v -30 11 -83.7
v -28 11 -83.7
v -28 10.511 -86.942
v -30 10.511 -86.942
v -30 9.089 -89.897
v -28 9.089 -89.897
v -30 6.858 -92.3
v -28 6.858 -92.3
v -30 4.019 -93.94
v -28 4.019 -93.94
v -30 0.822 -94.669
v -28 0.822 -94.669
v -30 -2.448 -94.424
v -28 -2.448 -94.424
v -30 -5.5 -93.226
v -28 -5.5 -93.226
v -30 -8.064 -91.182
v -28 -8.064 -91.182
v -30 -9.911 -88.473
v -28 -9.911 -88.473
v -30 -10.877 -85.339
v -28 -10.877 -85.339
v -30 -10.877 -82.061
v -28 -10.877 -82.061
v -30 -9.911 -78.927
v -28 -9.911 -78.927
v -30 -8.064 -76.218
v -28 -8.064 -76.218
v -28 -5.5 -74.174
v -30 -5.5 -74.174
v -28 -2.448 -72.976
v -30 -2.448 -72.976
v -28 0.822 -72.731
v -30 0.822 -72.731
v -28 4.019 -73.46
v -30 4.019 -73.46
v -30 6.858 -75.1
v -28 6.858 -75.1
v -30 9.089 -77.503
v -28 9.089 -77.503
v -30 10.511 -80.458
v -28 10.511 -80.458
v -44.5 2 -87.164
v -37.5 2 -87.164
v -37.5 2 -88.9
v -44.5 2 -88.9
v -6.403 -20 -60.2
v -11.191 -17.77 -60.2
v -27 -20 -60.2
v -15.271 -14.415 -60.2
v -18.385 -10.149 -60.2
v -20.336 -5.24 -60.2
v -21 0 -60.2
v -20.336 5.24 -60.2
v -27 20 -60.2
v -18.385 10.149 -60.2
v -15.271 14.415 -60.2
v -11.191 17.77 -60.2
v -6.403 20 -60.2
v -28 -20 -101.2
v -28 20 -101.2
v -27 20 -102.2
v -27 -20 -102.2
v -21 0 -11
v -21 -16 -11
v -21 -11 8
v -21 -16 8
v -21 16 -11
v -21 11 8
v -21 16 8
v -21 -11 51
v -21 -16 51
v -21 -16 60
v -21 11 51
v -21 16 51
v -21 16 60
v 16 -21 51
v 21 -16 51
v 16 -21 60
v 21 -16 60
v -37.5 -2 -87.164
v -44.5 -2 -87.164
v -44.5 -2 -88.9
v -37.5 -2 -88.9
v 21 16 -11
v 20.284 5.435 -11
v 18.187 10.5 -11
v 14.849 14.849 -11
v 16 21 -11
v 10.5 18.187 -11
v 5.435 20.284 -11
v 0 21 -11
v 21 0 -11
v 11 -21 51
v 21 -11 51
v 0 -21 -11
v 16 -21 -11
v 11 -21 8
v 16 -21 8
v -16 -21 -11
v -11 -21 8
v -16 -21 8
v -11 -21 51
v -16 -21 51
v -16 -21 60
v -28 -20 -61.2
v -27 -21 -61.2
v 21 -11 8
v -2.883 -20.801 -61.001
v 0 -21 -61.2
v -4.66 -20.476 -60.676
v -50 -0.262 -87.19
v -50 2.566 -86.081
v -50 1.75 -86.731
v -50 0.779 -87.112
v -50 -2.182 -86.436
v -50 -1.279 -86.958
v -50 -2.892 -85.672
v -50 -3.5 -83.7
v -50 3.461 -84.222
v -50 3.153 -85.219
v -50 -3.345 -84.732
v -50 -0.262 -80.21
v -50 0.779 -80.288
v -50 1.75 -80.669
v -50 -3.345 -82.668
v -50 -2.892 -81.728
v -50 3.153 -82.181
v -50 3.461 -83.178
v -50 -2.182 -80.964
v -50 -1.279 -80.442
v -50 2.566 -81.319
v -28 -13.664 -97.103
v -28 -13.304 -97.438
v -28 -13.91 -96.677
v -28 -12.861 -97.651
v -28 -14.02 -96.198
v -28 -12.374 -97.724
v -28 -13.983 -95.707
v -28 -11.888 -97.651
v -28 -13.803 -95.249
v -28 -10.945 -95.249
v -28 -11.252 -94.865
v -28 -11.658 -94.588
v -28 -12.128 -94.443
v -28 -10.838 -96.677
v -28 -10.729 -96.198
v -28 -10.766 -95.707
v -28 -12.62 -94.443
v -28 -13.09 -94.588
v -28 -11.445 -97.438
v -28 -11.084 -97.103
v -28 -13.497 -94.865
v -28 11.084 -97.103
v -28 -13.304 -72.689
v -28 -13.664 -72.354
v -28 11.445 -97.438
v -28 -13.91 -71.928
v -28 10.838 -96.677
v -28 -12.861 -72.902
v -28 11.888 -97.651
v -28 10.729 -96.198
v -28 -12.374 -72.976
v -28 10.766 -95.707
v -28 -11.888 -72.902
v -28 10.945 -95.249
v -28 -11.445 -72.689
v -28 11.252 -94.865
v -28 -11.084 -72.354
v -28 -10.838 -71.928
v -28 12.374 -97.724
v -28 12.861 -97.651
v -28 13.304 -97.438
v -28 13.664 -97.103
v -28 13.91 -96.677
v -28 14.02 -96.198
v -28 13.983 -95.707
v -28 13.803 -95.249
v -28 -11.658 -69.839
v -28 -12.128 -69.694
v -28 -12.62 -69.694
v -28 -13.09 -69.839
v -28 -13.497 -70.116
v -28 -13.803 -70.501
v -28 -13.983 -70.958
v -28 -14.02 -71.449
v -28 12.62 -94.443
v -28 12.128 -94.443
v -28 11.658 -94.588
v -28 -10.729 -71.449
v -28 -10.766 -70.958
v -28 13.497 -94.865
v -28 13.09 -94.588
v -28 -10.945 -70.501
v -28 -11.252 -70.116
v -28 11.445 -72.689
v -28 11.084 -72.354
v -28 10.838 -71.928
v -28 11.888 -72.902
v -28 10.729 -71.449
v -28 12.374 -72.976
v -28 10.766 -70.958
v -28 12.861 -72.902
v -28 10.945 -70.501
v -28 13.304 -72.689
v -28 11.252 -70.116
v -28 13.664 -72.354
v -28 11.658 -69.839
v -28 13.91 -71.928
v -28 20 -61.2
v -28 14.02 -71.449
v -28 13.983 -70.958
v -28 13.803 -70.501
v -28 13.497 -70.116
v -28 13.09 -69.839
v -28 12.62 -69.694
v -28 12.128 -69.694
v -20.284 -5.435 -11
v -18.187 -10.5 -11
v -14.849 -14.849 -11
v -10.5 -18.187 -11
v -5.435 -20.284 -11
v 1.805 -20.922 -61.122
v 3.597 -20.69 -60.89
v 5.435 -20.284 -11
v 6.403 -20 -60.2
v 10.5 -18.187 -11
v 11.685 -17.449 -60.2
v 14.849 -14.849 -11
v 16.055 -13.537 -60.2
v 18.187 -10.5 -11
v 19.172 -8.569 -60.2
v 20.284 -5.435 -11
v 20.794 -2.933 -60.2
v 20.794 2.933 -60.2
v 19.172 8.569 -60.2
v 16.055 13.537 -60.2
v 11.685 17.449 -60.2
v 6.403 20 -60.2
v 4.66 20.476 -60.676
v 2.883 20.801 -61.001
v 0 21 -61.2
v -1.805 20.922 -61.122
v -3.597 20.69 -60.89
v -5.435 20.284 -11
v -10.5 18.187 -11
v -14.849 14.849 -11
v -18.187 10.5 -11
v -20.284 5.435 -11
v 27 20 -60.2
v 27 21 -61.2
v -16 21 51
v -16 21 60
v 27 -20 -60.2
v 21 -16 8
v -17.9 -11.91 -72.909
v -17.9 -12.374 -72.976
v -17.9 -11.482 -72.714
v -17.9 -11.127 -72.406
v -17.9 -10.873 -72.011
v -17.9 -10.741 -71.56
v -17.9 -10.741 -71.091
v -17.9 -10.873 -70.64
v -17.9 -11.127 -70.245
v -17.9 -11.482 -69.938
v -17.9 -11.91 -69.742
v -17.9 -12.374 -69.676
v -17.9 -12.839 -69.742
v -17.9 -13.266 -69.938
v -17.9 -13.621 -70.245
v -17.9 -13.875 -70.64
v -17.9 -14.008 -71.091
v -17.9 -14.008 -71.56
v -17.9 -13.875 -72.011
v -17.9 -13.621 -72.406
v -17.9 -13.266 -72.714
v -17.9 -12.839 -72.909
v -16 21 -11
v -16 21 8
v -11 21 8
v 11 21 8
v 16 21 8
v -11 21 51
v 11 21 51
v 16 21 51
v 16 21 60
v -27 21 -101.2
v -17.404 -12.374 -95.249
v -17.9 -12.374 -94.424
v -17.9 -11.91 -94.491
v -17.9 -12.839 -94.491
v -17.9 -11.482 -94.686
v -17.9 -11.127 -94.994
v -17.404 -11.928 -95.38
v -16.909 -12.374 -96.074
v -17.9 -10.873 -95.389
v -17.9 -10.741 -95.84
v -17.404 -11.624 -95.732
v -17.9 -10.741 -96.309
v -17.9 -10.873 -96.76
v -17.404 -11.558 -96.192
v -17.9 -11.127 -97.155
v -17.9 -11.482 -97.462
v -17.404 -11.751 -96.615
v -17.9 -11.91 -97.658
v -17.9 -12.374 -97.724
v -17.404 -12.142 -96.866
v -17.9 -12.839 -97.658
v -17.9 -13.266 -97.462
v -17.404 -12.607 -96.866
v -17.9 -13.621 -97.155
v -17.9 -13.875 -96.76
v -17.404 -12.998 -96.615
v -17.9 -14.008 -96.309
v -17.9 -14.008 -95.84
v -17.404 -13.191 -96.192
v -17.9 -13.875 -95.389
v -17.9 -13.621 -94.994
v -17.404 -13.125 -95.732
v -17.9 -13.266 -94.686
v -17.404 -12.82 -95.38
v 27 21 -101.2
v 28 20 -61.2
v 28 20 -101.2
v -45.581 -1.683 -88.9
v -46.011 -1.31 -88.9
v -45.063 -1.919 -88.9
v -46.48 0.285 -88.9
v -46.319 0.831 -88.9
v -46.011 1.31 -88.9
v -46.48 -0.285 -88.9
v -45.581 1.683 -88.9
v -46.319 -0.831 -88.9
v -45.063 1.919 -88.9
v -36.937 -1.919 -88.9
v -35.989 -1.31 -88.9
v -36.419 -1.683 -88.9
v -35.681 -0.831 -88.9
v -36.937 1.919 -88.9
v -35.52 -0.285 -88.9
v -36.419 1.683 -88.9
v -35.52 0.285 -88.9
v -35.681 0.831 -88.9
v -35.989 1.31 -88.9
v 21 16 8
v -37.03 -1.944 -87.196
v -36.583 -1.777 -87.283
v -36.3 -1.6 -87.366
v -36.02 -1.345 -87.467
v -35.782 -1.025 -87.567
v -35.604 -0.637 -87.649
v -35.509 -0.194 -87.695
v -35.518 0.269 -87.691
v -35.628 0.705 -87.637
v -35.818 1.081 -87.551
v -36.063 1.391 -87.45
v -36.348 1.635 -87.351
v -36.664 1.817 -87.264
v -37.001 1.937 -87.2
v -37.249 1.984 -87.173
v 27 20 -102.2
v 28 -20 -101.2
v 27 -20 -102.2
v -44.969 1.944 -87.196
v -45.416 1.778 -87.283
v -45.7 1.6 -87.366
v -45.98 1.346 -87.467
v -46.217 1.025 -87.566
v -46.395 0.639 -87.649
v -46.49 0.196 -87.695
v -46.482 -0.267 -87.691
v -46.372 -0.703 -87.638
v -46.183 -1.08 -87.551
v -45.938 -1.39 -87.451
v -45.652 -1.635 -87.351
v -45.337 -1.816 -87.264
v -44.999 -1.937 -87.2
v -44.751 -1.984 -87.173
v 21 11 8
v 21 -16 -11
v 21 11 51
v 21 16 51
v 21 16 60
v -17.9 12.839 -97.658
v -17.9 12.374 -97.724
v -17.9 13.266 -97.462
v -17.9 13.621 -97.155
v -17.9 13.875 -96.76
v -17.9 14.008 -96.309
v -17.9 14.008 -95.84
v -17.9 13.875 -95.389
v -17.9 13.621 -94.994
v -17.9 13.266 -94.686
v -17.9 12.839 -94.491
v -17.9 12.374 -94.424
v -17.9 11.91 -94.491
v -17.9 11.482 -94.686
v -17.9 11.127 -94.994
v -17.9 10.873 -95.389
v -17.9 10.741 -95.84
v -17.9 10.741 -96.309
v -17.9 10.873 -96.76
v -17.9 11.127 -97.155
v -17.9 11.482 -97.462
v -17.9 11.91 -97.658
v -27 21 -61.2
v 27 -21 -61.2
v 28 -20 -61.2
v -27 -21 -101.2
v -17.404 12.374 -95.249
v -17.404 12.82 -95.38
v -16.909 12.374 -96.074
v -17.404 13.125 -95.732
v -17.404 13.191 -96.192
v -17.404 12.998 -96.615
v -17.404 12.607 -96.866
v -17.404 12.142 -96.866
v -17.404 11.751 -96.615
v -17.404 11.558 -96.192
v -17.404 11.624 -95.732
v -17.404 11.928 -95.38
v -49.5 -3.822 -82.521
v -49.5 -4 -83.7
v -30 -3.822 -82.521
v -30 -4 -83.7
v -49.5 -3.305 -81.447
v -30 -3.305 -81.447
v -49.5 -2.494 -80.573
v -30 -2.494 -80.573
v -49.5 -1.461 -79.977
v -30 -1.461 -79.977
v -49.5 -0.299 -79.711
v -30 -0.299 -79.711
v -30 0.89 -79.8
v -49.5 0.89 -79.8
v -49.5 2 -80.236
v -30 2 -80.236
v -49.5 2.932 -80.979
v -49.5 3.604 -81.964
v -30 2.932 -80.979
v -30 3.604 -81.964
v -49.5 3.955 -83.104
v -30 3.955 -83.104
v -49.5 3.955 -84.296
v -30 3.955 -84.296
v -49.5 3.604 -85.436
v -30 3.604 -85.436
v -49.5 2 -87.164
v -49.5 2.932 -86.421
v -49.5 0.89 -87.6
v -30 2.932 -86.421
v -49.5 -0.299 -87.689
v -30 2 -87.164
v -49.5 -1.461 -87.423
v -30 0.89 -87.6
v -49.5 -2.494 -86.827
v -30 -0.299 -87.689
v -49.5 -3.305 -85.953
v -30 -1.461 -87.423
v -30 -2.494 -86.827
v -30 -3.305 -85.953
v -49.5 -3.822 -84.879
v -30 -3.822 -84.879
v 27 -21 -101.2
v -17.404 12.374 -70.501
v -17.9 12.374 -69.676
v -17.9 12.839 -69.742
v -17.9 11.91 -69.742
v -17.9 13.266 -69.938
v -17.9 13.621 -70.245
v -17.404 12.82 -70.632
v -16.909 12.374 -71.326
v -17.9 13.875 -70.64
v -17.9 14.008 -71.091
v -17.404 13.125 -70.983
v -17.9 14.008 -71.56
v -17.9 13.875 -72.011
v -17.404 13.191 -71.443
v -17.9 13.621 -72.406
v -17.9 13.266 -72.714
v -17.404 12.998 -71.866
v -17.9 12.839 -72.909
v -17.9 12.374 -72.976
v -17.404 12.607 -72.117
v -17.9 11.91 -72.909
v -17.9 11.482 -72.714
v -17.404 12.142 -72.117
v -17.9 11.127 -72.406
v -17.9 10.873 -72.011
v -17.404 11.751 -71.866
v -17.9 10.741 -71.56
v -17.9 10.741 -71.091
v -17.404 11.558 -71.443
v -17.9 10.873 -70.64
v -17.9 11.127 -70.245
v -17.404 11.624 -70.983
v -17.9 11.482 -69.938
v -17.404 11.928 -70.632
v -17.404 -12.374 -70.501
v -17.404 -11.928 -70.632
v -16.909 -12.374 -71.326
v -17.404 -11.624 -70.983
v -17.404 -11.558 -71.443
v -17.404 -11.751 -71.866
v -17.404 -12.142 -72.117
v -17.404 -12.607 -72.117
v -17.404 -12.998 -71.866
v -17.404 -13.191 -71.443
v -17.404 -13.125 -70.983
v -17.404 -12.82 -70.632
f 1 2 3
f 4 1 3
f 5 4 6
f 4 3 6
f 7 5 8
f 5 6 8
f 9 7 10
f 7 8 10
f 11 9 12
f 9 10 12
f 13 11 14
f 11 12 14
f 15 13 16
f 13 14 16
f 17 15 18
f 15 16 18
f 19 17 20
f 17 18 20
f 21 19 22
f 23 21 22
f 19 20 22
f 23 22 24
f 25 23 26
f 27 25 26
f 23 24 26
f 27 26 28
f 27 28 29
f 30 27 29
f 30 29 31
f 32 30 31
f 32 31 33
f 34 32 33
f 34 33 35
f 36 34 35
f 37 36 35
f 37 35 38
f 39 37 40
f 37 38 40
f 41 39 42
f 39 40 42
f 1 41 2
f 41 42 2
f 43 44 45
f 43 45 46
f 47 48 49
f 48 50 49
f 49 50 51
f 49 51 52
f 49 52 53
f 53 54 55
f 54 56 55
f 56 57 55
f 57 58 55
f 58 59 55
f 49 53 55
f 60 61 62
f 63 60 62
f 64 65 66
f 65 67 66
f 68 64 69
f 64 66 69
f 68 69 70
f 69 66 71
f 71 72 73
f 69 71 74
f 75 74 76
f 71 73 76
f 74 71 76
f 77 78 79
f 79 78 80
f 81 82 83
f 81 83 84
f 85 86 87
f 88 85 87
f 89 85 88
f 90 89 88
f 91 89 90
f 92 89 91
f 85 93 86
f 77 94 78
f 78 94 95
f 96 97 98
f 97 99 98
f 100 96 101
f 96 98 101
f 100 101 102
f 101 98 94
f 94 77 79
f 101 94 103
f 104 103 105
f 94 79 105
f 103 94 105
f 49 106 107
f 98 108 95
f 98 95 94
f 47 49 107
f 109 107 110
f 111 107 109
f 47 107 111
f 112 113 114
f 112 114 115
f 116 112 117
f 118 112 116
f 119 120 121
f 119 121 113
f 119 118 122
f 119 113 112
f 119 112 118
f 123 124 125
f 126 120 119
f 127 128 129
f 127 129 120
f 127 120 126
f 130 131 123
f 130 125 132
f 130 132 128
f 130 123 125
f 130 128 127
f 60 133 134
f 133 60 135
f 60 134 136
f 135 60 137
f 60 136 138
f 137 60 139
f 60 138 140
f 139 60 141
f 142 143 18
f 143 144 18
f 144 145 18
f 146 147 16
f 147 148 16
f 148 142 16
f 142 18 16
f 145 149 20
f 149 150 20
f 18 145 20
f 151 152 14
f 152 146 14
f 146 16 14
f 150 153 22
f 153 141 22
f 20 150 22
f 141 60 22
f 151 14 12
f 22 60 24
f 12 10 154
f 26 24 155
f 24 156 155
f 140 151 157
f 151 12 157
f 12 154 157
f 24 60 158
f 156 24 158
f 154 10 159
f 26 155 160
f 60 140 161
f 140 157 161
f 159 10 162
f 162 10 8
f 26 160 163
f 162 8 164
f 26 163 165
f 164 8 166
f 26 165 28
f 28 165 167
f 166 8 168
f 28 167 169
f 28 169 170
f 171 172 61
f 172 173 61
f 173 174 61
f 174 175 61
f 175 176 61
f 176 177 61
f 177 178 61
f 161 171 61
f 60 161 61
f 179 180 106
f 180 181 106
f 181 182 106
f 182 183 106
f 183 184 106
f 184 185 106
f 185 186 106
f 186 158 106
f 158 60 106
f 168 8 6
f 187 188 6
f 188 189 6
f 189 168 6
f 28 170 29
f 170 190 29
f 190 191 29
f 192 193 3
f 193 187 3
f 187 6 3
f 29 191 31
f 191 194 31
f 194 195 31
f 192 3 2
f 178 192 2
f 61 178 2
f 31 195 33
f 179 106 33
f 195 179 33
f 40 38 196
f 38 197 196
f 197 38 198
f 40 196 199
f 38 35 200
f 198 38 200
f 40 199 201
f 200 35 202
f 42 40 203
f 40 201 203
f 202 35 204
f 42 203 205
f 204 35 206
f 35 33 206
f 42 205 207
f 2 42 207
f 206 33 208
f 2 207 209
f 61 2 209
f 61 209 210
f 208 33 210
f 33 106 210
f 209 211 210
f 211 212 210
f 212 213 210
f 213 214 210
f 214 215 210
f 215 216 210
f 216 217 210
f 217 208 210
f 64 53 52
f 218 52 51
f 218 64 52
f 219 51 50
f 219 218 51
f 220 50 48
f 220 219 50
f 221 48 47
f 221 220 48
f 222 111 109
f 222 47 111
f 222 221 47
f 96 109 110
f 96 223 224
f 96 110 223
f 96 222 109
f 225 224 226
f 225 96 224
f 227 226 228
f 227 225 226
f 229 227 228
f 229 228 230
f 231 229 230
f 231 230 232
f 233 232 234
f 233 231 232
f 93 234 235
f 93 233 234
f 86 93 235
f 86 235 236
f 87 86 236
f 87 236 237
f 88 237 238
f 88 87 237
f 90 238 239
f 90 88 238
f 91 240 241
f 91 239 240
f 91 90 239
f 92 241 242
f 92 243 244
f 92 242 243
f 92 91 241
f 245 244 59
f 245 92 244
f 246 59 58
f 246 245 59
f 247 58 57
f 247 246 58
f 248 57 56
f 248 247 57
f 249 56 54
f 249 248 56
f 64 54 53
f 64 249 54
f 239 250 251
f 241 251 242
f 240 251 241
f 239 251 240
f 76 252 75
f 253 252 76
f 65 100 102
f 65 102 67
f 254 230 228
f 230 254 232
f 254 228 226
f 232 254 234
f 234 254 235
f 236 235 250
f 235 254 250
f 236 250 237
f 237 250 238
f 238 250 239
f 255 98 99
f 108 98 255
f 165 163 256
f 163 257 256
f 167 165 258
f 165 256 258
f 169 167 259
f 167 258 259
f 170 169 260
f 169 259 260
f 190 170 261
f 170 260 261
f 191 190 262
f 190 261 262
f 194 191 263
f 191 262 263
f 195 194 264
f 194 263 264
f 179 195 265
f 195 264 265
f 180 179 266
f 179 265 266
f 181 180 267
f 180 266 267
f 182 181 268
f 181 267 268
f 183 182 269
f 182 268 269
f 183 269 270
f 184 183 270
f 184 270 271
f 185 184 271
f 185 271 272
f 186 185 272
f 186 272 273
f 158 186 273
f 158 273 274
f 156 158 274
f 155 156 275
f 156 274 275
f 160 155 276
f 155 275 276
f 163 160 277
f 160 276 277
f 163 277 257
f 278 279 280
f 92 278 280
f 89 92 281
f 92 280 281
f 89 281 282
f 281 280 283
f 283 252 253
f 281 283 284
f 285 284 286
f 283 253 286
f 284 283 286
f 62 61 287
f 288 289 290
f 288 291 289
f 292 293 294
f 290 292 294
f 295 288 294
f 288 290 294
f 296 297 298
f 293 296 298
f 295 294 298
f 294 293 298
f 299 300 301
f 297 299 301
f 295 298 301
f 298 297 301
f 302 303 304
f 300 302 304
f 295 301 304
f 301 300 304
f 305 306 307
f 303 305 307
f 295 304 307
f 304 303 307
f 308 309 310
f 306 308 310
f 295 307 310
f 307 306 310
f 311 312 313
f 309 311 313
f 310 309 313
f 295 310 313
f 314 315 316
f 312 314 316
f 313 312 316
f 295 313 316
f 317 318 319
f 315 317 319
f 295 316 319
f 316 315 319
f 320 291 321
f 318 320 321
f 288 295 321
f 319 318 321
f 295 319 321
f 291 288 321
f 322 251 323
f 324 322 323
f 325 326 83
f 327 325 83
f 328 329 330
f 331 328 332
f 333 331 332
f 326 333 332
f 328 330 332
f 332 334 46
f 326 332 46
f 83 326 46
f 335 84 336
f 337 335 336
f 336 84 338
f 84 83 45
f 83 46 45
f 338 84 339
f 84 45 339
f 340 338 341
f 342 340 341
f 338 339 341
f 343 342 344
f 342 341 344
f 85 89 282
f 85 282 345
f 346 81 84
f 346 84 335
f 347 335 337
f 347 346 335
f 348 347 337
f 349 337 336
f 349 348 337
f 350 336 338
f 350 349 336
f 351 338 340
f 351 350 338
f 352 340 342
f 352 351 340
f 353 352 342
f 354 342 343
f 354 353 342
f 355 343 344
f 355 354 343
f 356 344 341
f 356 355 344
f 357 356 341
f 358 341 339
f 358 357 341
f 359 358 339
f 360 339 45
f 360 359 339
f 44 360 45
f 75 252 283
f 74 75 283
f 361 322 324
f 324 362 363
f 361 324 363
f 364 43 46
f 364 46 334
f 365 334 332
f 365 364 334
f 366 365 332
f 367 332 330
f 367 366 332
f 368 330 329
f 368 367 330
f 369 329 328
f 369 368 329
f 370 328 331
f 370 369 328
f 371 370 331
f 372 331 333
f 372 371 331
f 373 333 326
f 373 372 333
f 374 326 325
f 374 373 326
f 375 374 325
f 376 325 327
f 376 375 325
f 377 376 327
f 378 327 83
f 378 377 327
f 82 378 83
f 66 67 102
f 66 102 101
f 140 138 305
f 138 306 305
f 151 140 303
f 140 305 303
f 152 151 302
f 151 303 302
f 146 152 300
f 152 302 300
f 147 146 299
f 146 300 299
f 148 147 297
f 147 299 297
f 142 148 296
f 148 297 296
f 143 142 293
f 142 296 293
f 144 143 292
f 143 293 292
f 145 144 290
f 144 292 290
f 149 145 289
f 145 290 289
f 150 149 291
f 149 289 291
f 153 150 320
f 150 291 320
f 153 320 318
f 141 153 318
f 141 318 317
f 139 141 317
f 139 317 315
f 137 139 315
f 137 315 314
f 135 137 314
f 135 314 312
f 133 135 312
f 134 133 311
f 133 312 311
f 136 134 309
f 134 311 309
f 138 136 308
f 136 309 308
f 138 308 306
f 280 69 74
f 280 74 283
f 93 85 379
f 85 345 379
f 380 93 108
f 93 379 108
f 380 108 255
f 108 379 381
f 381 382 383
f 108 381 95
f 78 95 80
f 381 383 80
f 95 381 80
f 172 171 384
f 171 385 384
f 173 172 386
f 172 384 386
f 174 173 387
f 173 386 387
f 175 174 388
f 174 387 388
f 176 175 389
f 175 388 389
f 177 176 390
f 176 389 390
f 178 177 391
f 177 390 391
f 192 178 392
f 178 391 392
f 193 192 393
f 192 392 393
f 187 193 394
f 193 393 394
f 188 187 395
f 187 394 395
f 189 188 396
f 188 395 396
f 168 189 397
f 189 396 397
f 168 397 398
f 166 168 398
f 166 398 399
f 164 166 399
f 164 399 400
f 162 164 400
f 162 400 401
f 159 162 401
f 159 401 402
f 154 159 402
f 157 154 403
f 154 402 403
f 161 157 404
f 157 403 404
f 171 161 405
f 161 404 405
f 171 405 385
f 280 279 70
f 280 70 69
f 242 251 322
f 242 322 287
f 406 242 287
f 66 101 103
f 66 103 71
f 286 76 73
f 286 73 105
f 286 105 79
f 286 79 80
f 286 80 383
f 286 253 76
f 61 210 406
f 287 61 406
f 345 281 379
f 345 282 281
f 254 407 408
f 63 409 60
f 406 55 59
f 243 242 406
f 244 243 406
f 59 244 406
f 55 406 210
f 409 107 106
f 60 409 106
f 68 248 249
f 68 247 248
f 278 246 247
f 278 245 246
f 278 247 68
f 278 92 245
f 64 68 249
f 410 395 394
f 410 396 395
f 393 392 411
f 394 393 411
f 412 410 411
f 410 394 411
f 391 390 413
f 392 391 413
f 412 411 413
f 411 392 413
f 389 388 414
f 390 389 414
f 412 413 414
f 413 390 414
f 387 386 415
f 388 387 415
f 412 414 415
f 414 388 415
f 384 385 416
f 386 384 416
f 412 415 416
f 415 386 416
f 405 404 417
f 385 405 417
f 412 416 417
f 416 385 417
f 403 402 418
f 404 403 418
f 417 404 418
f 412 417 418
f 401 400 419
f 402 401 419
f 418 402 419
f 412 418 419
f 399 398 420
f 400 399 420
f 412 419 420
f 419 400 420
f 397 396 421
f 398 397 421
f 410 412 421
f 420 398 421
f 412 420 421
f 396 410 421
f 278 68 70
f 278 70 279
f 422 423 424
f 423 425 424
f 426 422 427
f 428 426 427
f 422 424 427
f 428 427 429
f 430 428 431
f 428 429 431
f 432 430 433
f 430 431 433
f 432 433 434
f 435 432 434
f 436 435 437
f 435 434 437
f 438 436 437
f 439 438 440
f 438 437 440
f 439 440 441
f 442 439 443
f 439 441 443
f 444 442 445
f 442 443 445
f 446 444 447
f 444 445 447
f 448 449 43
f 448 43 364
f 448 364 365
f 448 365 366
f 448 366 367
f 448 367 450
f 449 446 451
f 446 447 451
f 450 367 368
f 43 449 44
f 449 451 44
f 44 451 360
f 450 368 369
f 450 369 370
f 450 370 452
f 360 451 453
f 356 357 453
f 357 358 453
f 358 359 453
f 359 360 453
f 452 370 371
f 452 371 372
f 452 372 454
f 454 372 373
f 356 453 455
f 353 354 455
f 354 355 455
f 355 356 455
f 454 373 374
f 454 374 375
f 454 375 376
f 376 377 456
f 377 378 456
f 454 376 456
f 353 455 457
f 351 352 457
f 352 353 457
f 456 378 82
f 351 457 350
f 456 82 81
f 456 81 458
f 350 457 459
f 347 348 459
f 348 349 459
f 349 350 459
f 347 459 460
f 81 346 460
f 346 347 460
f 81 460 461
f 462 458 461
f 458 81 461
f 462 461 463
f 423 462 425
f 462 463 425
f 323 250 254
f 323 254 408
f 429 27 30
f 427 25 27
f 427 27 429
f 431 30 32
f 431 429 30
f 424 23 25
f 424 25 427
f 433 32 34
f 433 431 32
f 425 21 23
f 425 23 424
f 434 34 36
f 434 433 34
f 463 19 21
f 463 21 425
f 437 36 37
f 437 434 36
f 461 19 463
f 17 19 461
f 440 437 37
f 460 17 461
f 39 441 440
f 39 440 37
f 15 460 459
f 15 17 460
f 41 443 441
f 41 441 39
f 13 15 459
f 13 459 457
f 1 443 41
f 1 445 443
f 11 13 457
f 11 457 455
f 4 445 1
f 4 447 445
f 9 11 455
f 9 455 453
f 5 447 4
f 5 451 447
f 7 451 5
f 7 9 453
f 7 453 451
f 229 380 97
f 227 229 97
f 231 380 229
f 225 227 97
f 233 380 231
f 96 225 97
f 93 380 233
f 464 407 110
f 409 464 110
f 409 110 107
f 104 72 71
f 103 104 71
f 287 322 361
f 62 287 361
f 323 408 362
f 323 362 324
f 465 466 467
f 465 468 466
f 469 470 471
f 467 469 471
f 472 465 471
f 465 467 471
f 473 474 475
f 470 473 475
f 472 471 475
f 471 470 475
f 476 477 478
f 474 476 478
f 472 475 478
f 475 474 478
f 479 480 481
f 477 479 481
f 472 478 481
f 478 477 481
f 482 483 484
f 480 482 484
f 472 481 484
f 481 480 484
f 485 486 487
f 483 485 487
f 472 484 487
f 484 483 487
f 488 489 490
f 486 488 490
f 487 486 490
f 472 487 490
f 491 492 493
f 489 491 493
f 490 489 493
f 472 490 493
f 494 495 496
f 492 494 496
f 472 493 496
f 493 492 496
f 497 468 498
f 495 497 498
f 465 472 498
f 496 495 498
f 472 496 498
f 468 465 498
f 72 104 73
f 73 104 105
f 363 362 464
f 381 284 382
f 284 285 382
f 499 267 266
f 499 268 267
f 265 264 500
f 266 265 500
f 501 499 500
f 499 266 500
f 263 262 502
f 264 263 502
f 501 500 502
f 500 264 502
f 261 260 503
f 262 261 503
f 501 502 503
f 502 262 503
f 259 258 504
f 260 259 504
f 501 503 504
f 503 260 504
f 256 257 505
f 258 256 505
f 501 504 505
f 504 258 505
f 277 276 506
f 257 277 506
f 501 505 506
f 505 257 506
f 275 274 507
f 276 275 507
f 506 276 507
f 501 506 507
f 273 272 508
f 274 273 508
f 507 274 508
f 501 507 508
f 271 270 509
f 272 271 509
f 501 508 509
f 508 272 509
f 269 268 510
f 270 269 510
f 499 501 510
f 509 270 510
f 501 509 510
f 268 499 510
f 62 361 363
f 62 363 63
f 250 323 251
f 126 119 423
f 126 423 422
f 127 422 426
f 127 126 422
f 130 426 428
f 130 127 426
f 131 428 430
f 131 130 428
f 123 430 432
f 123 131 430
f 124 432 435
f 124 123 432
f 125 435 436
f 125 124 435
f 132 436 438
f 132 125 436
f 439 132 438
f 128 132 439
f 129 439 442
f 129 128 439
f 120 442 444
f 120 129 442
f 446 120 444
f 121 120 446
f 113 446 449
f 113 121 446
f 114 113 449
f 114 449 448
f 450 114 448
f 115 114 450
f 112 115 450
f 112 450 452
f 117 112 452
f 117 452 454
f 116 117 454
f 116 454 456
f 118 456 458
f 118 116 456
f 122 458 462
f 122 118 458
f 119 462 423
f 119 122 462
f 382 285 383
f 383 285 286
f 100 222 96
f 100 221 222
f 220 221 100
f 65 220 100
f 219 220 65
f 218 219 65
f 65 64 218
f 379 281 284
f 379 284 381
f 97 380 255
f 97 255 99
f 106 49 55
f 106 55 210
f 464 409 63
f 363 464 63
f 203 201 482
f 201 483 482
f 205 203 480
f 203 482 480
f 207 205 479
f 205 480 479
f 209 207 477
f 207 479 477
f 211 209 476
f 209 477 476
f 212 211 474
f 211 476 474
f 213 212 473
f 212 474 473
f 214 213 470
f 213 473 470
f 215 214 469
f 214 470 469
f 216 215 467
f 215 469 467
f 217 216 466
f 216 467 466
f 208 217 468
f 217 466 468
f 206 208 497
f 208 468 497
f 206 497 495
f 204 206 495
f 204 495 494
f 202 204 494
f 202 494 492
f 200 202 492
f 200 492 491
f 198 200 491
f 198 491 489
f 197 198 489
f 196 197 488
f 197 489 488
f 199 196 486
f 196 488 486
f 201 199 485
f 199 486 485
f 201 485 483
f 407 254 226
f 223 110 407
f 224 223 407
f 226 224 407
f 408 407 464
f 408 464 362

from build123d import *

# Parameters (mm, degrees)
SKETCH_1_W             = 42
SKETCH_1_H             = 42
EXTRUDE_1_DEPTH        = 60
CHAMFER_1_SIZE         = 5
CUT_EXTRUDE_1_DEPTH    = 43
EXTRUDE_2_DEPTH        = 11
SKETCH_4_R             = 21
EXTRUDE_3_DEPTH        = 49.2
SKETCH_5_W             = 56
SKETCH_5_H             = 42
EXTRUDE_4_DEPTH        = 42
CHAMFER_2_SIZE         = 1
HOLE_WIZARD_M4_1_D     = 3.3
HOLE_WIZARD_M4_1_DEPTH = 10.1
HOLE_WIZARD_M4_1_TIP   = 0.991420021
SKETCH_10_R            = 11
EXTRUDE_5_DEPTH        = 2
SKETCH_11_R            = 4
EXTRUDE_6_DEPTH        = 20
CHAMFER_3_SIZE         = 0.5
EXTRUDE_7_DEPTH        = 1.2
EXTRUDE_7_DEPTH_BACK   = 1


with BuildPart() as part:
    # 스케치1 → 보스-돌출1 (new body)
    with BuildSketch(Plane.XY):
        Rectangle(SKETCH_1_W, SKETCH_1_H)
    extrude(amount=EXTRUDE_1_DEPTH)

    # 모따기1
    chamfer_1_edges = [part.edges().sort_by_distance(p)[0] for p in [
        (21, 21, 30),
        (21, -21, 30),
        (-21, 21, 30),
        (-21, -21, 30),
        (-21, 21, 30),
        (-21, -21, 30),
        (21, 21, 30),
        (21, -21, 30),
        (21, -21, 30),
        (-21, -21, 30),
        (-21, 21, 30),
        (21, 21, 30),
    ]]
    chamfer(chamfer_1_edges, length=CHAMFER_1_SIZE)

    # 스케치2 → 컷-돌출1 (cut)
    with BuildSketch(Plane.XY.offset(51)):
        Polygon((-11, 21), (-21, 21), (-21, 11), align=None)
        Polygon((21, 11), (21, 21), (11, 21), align=None)
        Polygon((11, -21), (21, -21), (21, -11), align=None)
        Polygon((-21, -11), (-21, -21), (-11, -21), align=None)
    extrude(amount=-CUT_EXTRUDE_1_DEPTH, mode=Mode.SUBTRACT)

    # 스케치3 → 보스-돌출2 (add)
    with BuildSketch(Plane(origin=(0, 0, 0), x_dir=(-1, 0, 0), z_dir=(0, 0, -1))):
        Polygon((-16, 21), (-21, 16), (-21, -16), (-16, -21), (16, -21), (21, -16), (21, 16), (16, 21), align=None)
    extrude(amount=EXTRUDE_2_DEPTH)

    # 스케치4 → 보스-돌출3 (add)
    with BuildSketch(Plane(origin=(0, 0, -11), x_dir=(-1, 0, 0), z_dir=(0, 0, -1))):
        Circle(SKETCH_4_R)
    extrude(amount=EXTRUDE_3_DEPTH)

    # 스케치5 → 보스-돌출4 (add)
    with BuildSketch(Plane(origin=(0, 0, -60.2), x_dir=(-1, 0, 0), z_dir=(0, 0, -1))):
        Rectangle(SKETCH_5_W, SKETCH_5_H)
    extrude(amount=EXTRUDE_4_DEPTH)

    # 모따기2
    # the kernel refuses this chamfer: 1 mm, written as the material it takes off along each edge
    with BuildSketch(Plane(origin=(-27.333333333, 20.333333333, -60.866666667), x_dir=(0.7071067811865475, 0.7071067811865475, 0), z_dir=(-0.5773502691896258, 0.5773502691896258, 0.5773502691896258)), Plane(origin=(-27.333333333, -20.333333333, -60.866666667), x_dir=(-0.7071067811865475, 0.7071067811865475, 0), z_dir=(-0.5773502691896258, -0.5773502691896258, 0.5773502691896258)), Plane(origin=(27.333333333, 20.333333333, -60.866666667), x_dir=(0.7071067811865475, -0.7071067811865475, 0), z_dir=(0.5773502691896258, 0.5773502691896258, 0.5773502691896258)), Plane(origin=(27.333333333, -20.333333333, -101.533333333), x_dir=(0.7071067811865475, 0.7071067811865475, 0), z_dir=(0.5773502691896258, -0.5773502691896258, -0.5773502691896258))) as chamfer_2_piece_1:
        Polygon((-0.707106781, 0.40824829), (0.707106781, 0.40824829), (0, -0.816496581), align=None)
    extrude(amount=1.270170592, mode=Mode.SUBTRACT)
    with BuildSketch(Plane(origin=(-27.333333333, -20.333333333, -101.533333333), x_dir=(-0.7071067811865475, 0.7071067811865475, 0), z_dir=(-0.5773502691896258, -0.5773502691896258, -0.5773502691896258)), Plane(origin=(-27.333333333, 20.333333333, -101.533333333), x_dir=(0.7071067811865475, 0.7071067811865475, 0), z_dir=(-0.5773502691896258, 0.5773502691896258, -0.5773502691896258)), Plane(origin=(27.333333333, -20.333333333, -60.866666667), x_dir=(0.7071067811865475, 0.7071067811865475, 0), z_dir=(0.5773502691896258, -0.5773502691896258, 0.5773502691896258)), Plane(origin=(27.333333333, 20.333333333, -101.533333333), x_dir=(0.7071067811865475, -0.7071067811865475, 0), z_dir=(0.5773502691896258, 0.5773502691896258, -0.5773502691896258))) as chamfer_2_piece_2:
        Polygon((-0.707106781, -0.40824829), (0.707106781, -0.40824829), (0, 0.816496581), align=None)
    extrude(amount=1.270170592, mode=Mode.SUBTRACT)
    with BuildSketch(Plane(origin=(-28, 23.571682988, -60.2), x_dir=(0.9996219169112968, 0, 0.0274958766105891), z_dir=(0, -1, 0)), Plane(origin=(-28, -21, -57.628317012), x_dir=(0.9996219169112968, -0.027495876610585647, 0), z_dir=(0, 0, -1)), Plane(origin=(-28, 21, -57.628317012), x_dir=(-0.027495876610585647, -0.9996219169112968, 0), z_dir=(0, 0, -1)), Plane(origin=(28, -23.571682988, -60.2), x_dir=(-0.9996219169112968, 0, 0.0274958766105891), z_dir=(0, 1, 0)), Plane(origin=(28, 21, -57.628317012), x_dir=(-0.9996219169112968, 0.027495876610585647, 0), z_dir=(0, 0, -1)), Plane(origin=(-28, 23.571682988, -102.2), x_dir=(-0.02749587661058574, 0, 0.9996219169112968), z_dir=(0, -1, 0)), Plane(origin=(28, -23.571682988, -102.2), x_dir=(0.02749587661058574, 0, 0.9996219169112968), z_dir=(0, 1, 0))) as chamfer_2_piece_3:
        Polygon((CHAMFER_2_SIZE * 0.999621916911, -CHAMFER_2_SIZE * 0.0274958766106), (-CHAMFER_2_SIZE * 0.0274958766106, -CHAMFER_2_SIZE * 0.999621916911), (0, 0), align=None)
    extrude(amount=47.143365976, mode=Mode.SUBTRACT)
    with BuildSketch(Plane(origin=(0, 21, -60.2), x_dir=(0, -0.9996219169112968, 0.0274958766105891), z_dir=(-1, 0, 0))) as chamfer_2_piece_4_section:
        Polygon((CHAMFER_2_SIZE * 0.999621916911, -CHAMFER_2_SIZE * 0.0274958766106), (-CHAMFER_2_SIZE * 0.0274958766106, -CHAMFER_2_SIZE * 0.999621916911), (0, 0), align=None)
    chamfer_2_piece_4 = extrude(amount=30.571682988, mode=Mode.PRIVATE)
    chamfer_2_piece_4 = chamfer_2_piece_4 - Plane(origin=(0, 0, -60.539954397), x_dir=(-1, 0, 0), z_dir=(0, 0, 1)) * Cylinder(21, 66, mode=Mode.PRIVATE)
    add(chamfer_2_piece_4, mode=Mode.SUBTRACT)
    with BuildSketch(Plane(origin=(30.571682988, 21, -60.2), x_dir=(0, -0.9996219169112968, 0.0274958766105891), z_dir=(-1, 0, 0))) as chamfer_2_piece_5_section:
        Polygon((CHAMFER_2_SIZE * 0.999621916911, -CHAMFER_2_SIZE * 0.0274958766106), (-CHAMFER_2_SIZE * 0.0274958766106, -CHAMFER_2_SIZE * 0.999621916911), (0, 0), align=None)
    chamfer_2_piece_5 = extrude(amount=30.571682988, mode=Mode.PRIVATE)
    chamfer_2_piece_5 = chamfer_2_piece_5 - Plane(origin=(0, 0, -60.539954397), x_dir=(-1, 0, 0), z_dir=(0, 0, 1)) * Cylinder(21, 66, mode=Mode.PRIVATE)
    add(chamfer_2_piece_5, mode=Mode.SUBTRACT)
    with BuildSketch(Plane(origin=(4.1e-08, -21, -60.2), x_dir=(0, 0.9996219169112968, 0.0274958766105891), z_dir=(1, 0, 0))) as chamfer_2_piece_6_section:
        Polygon((CHAMFER_2_SIZE * 0.999621916911, -CHAMFER_2_SIZE * 0.0274958766106), (-CHAMFER_2_SIZE * 0.0274958766106, -CHAMFER_2_SIZE * 0.999621916911), (0, 0), align=None)
    chamfer_2_piece_6 = extrude(amount=30.571682947, mode=Mode.PRIVATE)
    chamfer_2_piece_6 = chamfer_2_piece_6 - Plane(origin=(0, 0, -60.539954397), x_dir=(-1, 0, 0), z_dir=(0, 0, 1)) * Cylinder(21, 66, mode=Mode.PRIVATE)
    add(chamfer_2_piece_6, mode=Mode.SUBTRACT)
    with BuildSketch(Plane(origin=(-30.571682988, -21, -60.2), x_dir=(0, 0.9996219169112968, 0.0274958766105891), z_dir=(1, 0, 0))) as chamfer_2_piece_7_section:
        Polygon((CHAMFER_2_SIZE * 0.999621916911, -CHAMFER_2_SIZE * 0.0274958766106), (-CHAMFER_2_SIZE * 0.0274958766106, -CHAMFER_2_SIZE * 0.999621916911), (0, 0), align=None)
    chamfer_2_piece_7 = extrude(amount=30.571683029, mode=Mode.PRIVATE)
    chamfer_2_piece_7 = chamfer_2_piece_7 - Plane(origin=(0, 0, -60.539954397), x_dir=(-1, 0, 0), z_dir=(0, 0, 1)) * Cylinder(21, 66, mode=Mode.PRIVATE)
    add(chamfer_2_piece_7, mode=Mode.SUBTRACT)
    with BuildSketch(Plane(origin=(28, -21, -57.628317012), x_dir=(-0.9996219169112968, -0.027495876610585647, 0), z_dir=(0, 0, -1))) as chamfer_2_piece_8:
        Polygon((CHAMFER_2_SIZE * 0.999621916911, CHAMFER_2_SIZE * 0.0274958766106), (-CHAMFER_2_SIZE * 0.0274958766106, CHAMFER_2_SIZE * 0.999621916911), (0, 0), align=None)
    extrude(amount=47.143365976, mode=Mode.SUBTRACT)
    with BuildSketch(Plane(origin=(30.571682988, 21, -102.2), x_dir=(0, 0.02749587661058574, 0.9996219169112968), z_dir=(-1, 0, 0)), Plane(origin=(-30.571682988, -21, -102.2), x_dir=(0, -0.02749587661058574, 0.9996219169112968), z_dir=(1, 0, 0))) as chamfer_2_piece_9:
        Polygon((CHAMFER_2_SIZE * 0.999621916911, -CHAMFER_2_SIZE * 0.0274958766106), (-CHAMFER_2_SIZE * 0.0274958766106, -CHAMFER_2_SIZE * 0.999621916911), (0, 0), align=None)
    extrude(amount=61.143365976, mode=Mode.SUBTRACT)

    # M4 나사 구멍1
    with Locations(Plane.ZY.offset(28)):
        with Locations((-96.074368671, 12.374368671), (-71.325631329, 12.374368671), (-71.325631329, -12.374368671), (-96.074368671, -12.374368671)):
            Hole(HOLE_WIZARD_M4_1_D / 2, depth=HOLE_WIZARD_M4_1_DEPTH)
            with Locations((0, 0, -(HOLE_WIZARD_M4_1_DEPTH + HOLE_WIZARD_M4_1_TIP / 2))):  # 118° drill point
                Cone(0, HOLE_WIZARD_M4_1_D / 2, HOLE_WIZARD_M4_1_TIP, mode=Mode.SUBTRACT)

    # 스케치10 → 보스-돌출5 (add)
    with BuildSketch(Plane.ZY.offset(28)):
        with Locations(Location((-83.7, 0, 0), (0, 0, 90))):
            Circle(SKETCH_10_R)
    extrude(amount=EXTRUDE_5_DEPTH)

    # 스케치11 → 보스-돌출6 (add)
    with BuildSketch(Plane.ZY.offset(30)):
        with Locations(Location((-83.7, 0, 0), (0, 0, 270))):
            Circle(SKETCH_11_R)
    extrude(amount=EXTRUDE_6_DEPTH)

    # 모따기3
    chamfer_3_edges = [part.edges().sort_by_distance(p)[0] for p in [
        (-50, 4, -83.7),
    ]]
    chamfer(chamfer_3_edges, length=CHAMFER_3_SIZE)

    # 스케치12 → 보스-돌출7 (add, two sides: drawn at the far end of the back side and taken through both)
    with BuildSketch(Plane(origin=(0, 0, -87.7), x_dir=(-1, 0, 0), z_dir=(0, 0, -1)).offset(-EXTRUDE_7_DEPTH_BACK)):
        with BuildLine():
            Line((37.5, 2), (44.5, 2))
            ThreePointArc((44.5, 2), (46.5, 0), (44.5, -2))
            Line((44.5, -2), (37.5, -2))
            ThreePointArc((37.5, -2), (35.5, 0), (37.5, 2))
        make_face()
    extrude(amount=EXTRUDE_7_DEPTH + EXTRUDE_7_DEPTH_BACK)


solid = part.part
